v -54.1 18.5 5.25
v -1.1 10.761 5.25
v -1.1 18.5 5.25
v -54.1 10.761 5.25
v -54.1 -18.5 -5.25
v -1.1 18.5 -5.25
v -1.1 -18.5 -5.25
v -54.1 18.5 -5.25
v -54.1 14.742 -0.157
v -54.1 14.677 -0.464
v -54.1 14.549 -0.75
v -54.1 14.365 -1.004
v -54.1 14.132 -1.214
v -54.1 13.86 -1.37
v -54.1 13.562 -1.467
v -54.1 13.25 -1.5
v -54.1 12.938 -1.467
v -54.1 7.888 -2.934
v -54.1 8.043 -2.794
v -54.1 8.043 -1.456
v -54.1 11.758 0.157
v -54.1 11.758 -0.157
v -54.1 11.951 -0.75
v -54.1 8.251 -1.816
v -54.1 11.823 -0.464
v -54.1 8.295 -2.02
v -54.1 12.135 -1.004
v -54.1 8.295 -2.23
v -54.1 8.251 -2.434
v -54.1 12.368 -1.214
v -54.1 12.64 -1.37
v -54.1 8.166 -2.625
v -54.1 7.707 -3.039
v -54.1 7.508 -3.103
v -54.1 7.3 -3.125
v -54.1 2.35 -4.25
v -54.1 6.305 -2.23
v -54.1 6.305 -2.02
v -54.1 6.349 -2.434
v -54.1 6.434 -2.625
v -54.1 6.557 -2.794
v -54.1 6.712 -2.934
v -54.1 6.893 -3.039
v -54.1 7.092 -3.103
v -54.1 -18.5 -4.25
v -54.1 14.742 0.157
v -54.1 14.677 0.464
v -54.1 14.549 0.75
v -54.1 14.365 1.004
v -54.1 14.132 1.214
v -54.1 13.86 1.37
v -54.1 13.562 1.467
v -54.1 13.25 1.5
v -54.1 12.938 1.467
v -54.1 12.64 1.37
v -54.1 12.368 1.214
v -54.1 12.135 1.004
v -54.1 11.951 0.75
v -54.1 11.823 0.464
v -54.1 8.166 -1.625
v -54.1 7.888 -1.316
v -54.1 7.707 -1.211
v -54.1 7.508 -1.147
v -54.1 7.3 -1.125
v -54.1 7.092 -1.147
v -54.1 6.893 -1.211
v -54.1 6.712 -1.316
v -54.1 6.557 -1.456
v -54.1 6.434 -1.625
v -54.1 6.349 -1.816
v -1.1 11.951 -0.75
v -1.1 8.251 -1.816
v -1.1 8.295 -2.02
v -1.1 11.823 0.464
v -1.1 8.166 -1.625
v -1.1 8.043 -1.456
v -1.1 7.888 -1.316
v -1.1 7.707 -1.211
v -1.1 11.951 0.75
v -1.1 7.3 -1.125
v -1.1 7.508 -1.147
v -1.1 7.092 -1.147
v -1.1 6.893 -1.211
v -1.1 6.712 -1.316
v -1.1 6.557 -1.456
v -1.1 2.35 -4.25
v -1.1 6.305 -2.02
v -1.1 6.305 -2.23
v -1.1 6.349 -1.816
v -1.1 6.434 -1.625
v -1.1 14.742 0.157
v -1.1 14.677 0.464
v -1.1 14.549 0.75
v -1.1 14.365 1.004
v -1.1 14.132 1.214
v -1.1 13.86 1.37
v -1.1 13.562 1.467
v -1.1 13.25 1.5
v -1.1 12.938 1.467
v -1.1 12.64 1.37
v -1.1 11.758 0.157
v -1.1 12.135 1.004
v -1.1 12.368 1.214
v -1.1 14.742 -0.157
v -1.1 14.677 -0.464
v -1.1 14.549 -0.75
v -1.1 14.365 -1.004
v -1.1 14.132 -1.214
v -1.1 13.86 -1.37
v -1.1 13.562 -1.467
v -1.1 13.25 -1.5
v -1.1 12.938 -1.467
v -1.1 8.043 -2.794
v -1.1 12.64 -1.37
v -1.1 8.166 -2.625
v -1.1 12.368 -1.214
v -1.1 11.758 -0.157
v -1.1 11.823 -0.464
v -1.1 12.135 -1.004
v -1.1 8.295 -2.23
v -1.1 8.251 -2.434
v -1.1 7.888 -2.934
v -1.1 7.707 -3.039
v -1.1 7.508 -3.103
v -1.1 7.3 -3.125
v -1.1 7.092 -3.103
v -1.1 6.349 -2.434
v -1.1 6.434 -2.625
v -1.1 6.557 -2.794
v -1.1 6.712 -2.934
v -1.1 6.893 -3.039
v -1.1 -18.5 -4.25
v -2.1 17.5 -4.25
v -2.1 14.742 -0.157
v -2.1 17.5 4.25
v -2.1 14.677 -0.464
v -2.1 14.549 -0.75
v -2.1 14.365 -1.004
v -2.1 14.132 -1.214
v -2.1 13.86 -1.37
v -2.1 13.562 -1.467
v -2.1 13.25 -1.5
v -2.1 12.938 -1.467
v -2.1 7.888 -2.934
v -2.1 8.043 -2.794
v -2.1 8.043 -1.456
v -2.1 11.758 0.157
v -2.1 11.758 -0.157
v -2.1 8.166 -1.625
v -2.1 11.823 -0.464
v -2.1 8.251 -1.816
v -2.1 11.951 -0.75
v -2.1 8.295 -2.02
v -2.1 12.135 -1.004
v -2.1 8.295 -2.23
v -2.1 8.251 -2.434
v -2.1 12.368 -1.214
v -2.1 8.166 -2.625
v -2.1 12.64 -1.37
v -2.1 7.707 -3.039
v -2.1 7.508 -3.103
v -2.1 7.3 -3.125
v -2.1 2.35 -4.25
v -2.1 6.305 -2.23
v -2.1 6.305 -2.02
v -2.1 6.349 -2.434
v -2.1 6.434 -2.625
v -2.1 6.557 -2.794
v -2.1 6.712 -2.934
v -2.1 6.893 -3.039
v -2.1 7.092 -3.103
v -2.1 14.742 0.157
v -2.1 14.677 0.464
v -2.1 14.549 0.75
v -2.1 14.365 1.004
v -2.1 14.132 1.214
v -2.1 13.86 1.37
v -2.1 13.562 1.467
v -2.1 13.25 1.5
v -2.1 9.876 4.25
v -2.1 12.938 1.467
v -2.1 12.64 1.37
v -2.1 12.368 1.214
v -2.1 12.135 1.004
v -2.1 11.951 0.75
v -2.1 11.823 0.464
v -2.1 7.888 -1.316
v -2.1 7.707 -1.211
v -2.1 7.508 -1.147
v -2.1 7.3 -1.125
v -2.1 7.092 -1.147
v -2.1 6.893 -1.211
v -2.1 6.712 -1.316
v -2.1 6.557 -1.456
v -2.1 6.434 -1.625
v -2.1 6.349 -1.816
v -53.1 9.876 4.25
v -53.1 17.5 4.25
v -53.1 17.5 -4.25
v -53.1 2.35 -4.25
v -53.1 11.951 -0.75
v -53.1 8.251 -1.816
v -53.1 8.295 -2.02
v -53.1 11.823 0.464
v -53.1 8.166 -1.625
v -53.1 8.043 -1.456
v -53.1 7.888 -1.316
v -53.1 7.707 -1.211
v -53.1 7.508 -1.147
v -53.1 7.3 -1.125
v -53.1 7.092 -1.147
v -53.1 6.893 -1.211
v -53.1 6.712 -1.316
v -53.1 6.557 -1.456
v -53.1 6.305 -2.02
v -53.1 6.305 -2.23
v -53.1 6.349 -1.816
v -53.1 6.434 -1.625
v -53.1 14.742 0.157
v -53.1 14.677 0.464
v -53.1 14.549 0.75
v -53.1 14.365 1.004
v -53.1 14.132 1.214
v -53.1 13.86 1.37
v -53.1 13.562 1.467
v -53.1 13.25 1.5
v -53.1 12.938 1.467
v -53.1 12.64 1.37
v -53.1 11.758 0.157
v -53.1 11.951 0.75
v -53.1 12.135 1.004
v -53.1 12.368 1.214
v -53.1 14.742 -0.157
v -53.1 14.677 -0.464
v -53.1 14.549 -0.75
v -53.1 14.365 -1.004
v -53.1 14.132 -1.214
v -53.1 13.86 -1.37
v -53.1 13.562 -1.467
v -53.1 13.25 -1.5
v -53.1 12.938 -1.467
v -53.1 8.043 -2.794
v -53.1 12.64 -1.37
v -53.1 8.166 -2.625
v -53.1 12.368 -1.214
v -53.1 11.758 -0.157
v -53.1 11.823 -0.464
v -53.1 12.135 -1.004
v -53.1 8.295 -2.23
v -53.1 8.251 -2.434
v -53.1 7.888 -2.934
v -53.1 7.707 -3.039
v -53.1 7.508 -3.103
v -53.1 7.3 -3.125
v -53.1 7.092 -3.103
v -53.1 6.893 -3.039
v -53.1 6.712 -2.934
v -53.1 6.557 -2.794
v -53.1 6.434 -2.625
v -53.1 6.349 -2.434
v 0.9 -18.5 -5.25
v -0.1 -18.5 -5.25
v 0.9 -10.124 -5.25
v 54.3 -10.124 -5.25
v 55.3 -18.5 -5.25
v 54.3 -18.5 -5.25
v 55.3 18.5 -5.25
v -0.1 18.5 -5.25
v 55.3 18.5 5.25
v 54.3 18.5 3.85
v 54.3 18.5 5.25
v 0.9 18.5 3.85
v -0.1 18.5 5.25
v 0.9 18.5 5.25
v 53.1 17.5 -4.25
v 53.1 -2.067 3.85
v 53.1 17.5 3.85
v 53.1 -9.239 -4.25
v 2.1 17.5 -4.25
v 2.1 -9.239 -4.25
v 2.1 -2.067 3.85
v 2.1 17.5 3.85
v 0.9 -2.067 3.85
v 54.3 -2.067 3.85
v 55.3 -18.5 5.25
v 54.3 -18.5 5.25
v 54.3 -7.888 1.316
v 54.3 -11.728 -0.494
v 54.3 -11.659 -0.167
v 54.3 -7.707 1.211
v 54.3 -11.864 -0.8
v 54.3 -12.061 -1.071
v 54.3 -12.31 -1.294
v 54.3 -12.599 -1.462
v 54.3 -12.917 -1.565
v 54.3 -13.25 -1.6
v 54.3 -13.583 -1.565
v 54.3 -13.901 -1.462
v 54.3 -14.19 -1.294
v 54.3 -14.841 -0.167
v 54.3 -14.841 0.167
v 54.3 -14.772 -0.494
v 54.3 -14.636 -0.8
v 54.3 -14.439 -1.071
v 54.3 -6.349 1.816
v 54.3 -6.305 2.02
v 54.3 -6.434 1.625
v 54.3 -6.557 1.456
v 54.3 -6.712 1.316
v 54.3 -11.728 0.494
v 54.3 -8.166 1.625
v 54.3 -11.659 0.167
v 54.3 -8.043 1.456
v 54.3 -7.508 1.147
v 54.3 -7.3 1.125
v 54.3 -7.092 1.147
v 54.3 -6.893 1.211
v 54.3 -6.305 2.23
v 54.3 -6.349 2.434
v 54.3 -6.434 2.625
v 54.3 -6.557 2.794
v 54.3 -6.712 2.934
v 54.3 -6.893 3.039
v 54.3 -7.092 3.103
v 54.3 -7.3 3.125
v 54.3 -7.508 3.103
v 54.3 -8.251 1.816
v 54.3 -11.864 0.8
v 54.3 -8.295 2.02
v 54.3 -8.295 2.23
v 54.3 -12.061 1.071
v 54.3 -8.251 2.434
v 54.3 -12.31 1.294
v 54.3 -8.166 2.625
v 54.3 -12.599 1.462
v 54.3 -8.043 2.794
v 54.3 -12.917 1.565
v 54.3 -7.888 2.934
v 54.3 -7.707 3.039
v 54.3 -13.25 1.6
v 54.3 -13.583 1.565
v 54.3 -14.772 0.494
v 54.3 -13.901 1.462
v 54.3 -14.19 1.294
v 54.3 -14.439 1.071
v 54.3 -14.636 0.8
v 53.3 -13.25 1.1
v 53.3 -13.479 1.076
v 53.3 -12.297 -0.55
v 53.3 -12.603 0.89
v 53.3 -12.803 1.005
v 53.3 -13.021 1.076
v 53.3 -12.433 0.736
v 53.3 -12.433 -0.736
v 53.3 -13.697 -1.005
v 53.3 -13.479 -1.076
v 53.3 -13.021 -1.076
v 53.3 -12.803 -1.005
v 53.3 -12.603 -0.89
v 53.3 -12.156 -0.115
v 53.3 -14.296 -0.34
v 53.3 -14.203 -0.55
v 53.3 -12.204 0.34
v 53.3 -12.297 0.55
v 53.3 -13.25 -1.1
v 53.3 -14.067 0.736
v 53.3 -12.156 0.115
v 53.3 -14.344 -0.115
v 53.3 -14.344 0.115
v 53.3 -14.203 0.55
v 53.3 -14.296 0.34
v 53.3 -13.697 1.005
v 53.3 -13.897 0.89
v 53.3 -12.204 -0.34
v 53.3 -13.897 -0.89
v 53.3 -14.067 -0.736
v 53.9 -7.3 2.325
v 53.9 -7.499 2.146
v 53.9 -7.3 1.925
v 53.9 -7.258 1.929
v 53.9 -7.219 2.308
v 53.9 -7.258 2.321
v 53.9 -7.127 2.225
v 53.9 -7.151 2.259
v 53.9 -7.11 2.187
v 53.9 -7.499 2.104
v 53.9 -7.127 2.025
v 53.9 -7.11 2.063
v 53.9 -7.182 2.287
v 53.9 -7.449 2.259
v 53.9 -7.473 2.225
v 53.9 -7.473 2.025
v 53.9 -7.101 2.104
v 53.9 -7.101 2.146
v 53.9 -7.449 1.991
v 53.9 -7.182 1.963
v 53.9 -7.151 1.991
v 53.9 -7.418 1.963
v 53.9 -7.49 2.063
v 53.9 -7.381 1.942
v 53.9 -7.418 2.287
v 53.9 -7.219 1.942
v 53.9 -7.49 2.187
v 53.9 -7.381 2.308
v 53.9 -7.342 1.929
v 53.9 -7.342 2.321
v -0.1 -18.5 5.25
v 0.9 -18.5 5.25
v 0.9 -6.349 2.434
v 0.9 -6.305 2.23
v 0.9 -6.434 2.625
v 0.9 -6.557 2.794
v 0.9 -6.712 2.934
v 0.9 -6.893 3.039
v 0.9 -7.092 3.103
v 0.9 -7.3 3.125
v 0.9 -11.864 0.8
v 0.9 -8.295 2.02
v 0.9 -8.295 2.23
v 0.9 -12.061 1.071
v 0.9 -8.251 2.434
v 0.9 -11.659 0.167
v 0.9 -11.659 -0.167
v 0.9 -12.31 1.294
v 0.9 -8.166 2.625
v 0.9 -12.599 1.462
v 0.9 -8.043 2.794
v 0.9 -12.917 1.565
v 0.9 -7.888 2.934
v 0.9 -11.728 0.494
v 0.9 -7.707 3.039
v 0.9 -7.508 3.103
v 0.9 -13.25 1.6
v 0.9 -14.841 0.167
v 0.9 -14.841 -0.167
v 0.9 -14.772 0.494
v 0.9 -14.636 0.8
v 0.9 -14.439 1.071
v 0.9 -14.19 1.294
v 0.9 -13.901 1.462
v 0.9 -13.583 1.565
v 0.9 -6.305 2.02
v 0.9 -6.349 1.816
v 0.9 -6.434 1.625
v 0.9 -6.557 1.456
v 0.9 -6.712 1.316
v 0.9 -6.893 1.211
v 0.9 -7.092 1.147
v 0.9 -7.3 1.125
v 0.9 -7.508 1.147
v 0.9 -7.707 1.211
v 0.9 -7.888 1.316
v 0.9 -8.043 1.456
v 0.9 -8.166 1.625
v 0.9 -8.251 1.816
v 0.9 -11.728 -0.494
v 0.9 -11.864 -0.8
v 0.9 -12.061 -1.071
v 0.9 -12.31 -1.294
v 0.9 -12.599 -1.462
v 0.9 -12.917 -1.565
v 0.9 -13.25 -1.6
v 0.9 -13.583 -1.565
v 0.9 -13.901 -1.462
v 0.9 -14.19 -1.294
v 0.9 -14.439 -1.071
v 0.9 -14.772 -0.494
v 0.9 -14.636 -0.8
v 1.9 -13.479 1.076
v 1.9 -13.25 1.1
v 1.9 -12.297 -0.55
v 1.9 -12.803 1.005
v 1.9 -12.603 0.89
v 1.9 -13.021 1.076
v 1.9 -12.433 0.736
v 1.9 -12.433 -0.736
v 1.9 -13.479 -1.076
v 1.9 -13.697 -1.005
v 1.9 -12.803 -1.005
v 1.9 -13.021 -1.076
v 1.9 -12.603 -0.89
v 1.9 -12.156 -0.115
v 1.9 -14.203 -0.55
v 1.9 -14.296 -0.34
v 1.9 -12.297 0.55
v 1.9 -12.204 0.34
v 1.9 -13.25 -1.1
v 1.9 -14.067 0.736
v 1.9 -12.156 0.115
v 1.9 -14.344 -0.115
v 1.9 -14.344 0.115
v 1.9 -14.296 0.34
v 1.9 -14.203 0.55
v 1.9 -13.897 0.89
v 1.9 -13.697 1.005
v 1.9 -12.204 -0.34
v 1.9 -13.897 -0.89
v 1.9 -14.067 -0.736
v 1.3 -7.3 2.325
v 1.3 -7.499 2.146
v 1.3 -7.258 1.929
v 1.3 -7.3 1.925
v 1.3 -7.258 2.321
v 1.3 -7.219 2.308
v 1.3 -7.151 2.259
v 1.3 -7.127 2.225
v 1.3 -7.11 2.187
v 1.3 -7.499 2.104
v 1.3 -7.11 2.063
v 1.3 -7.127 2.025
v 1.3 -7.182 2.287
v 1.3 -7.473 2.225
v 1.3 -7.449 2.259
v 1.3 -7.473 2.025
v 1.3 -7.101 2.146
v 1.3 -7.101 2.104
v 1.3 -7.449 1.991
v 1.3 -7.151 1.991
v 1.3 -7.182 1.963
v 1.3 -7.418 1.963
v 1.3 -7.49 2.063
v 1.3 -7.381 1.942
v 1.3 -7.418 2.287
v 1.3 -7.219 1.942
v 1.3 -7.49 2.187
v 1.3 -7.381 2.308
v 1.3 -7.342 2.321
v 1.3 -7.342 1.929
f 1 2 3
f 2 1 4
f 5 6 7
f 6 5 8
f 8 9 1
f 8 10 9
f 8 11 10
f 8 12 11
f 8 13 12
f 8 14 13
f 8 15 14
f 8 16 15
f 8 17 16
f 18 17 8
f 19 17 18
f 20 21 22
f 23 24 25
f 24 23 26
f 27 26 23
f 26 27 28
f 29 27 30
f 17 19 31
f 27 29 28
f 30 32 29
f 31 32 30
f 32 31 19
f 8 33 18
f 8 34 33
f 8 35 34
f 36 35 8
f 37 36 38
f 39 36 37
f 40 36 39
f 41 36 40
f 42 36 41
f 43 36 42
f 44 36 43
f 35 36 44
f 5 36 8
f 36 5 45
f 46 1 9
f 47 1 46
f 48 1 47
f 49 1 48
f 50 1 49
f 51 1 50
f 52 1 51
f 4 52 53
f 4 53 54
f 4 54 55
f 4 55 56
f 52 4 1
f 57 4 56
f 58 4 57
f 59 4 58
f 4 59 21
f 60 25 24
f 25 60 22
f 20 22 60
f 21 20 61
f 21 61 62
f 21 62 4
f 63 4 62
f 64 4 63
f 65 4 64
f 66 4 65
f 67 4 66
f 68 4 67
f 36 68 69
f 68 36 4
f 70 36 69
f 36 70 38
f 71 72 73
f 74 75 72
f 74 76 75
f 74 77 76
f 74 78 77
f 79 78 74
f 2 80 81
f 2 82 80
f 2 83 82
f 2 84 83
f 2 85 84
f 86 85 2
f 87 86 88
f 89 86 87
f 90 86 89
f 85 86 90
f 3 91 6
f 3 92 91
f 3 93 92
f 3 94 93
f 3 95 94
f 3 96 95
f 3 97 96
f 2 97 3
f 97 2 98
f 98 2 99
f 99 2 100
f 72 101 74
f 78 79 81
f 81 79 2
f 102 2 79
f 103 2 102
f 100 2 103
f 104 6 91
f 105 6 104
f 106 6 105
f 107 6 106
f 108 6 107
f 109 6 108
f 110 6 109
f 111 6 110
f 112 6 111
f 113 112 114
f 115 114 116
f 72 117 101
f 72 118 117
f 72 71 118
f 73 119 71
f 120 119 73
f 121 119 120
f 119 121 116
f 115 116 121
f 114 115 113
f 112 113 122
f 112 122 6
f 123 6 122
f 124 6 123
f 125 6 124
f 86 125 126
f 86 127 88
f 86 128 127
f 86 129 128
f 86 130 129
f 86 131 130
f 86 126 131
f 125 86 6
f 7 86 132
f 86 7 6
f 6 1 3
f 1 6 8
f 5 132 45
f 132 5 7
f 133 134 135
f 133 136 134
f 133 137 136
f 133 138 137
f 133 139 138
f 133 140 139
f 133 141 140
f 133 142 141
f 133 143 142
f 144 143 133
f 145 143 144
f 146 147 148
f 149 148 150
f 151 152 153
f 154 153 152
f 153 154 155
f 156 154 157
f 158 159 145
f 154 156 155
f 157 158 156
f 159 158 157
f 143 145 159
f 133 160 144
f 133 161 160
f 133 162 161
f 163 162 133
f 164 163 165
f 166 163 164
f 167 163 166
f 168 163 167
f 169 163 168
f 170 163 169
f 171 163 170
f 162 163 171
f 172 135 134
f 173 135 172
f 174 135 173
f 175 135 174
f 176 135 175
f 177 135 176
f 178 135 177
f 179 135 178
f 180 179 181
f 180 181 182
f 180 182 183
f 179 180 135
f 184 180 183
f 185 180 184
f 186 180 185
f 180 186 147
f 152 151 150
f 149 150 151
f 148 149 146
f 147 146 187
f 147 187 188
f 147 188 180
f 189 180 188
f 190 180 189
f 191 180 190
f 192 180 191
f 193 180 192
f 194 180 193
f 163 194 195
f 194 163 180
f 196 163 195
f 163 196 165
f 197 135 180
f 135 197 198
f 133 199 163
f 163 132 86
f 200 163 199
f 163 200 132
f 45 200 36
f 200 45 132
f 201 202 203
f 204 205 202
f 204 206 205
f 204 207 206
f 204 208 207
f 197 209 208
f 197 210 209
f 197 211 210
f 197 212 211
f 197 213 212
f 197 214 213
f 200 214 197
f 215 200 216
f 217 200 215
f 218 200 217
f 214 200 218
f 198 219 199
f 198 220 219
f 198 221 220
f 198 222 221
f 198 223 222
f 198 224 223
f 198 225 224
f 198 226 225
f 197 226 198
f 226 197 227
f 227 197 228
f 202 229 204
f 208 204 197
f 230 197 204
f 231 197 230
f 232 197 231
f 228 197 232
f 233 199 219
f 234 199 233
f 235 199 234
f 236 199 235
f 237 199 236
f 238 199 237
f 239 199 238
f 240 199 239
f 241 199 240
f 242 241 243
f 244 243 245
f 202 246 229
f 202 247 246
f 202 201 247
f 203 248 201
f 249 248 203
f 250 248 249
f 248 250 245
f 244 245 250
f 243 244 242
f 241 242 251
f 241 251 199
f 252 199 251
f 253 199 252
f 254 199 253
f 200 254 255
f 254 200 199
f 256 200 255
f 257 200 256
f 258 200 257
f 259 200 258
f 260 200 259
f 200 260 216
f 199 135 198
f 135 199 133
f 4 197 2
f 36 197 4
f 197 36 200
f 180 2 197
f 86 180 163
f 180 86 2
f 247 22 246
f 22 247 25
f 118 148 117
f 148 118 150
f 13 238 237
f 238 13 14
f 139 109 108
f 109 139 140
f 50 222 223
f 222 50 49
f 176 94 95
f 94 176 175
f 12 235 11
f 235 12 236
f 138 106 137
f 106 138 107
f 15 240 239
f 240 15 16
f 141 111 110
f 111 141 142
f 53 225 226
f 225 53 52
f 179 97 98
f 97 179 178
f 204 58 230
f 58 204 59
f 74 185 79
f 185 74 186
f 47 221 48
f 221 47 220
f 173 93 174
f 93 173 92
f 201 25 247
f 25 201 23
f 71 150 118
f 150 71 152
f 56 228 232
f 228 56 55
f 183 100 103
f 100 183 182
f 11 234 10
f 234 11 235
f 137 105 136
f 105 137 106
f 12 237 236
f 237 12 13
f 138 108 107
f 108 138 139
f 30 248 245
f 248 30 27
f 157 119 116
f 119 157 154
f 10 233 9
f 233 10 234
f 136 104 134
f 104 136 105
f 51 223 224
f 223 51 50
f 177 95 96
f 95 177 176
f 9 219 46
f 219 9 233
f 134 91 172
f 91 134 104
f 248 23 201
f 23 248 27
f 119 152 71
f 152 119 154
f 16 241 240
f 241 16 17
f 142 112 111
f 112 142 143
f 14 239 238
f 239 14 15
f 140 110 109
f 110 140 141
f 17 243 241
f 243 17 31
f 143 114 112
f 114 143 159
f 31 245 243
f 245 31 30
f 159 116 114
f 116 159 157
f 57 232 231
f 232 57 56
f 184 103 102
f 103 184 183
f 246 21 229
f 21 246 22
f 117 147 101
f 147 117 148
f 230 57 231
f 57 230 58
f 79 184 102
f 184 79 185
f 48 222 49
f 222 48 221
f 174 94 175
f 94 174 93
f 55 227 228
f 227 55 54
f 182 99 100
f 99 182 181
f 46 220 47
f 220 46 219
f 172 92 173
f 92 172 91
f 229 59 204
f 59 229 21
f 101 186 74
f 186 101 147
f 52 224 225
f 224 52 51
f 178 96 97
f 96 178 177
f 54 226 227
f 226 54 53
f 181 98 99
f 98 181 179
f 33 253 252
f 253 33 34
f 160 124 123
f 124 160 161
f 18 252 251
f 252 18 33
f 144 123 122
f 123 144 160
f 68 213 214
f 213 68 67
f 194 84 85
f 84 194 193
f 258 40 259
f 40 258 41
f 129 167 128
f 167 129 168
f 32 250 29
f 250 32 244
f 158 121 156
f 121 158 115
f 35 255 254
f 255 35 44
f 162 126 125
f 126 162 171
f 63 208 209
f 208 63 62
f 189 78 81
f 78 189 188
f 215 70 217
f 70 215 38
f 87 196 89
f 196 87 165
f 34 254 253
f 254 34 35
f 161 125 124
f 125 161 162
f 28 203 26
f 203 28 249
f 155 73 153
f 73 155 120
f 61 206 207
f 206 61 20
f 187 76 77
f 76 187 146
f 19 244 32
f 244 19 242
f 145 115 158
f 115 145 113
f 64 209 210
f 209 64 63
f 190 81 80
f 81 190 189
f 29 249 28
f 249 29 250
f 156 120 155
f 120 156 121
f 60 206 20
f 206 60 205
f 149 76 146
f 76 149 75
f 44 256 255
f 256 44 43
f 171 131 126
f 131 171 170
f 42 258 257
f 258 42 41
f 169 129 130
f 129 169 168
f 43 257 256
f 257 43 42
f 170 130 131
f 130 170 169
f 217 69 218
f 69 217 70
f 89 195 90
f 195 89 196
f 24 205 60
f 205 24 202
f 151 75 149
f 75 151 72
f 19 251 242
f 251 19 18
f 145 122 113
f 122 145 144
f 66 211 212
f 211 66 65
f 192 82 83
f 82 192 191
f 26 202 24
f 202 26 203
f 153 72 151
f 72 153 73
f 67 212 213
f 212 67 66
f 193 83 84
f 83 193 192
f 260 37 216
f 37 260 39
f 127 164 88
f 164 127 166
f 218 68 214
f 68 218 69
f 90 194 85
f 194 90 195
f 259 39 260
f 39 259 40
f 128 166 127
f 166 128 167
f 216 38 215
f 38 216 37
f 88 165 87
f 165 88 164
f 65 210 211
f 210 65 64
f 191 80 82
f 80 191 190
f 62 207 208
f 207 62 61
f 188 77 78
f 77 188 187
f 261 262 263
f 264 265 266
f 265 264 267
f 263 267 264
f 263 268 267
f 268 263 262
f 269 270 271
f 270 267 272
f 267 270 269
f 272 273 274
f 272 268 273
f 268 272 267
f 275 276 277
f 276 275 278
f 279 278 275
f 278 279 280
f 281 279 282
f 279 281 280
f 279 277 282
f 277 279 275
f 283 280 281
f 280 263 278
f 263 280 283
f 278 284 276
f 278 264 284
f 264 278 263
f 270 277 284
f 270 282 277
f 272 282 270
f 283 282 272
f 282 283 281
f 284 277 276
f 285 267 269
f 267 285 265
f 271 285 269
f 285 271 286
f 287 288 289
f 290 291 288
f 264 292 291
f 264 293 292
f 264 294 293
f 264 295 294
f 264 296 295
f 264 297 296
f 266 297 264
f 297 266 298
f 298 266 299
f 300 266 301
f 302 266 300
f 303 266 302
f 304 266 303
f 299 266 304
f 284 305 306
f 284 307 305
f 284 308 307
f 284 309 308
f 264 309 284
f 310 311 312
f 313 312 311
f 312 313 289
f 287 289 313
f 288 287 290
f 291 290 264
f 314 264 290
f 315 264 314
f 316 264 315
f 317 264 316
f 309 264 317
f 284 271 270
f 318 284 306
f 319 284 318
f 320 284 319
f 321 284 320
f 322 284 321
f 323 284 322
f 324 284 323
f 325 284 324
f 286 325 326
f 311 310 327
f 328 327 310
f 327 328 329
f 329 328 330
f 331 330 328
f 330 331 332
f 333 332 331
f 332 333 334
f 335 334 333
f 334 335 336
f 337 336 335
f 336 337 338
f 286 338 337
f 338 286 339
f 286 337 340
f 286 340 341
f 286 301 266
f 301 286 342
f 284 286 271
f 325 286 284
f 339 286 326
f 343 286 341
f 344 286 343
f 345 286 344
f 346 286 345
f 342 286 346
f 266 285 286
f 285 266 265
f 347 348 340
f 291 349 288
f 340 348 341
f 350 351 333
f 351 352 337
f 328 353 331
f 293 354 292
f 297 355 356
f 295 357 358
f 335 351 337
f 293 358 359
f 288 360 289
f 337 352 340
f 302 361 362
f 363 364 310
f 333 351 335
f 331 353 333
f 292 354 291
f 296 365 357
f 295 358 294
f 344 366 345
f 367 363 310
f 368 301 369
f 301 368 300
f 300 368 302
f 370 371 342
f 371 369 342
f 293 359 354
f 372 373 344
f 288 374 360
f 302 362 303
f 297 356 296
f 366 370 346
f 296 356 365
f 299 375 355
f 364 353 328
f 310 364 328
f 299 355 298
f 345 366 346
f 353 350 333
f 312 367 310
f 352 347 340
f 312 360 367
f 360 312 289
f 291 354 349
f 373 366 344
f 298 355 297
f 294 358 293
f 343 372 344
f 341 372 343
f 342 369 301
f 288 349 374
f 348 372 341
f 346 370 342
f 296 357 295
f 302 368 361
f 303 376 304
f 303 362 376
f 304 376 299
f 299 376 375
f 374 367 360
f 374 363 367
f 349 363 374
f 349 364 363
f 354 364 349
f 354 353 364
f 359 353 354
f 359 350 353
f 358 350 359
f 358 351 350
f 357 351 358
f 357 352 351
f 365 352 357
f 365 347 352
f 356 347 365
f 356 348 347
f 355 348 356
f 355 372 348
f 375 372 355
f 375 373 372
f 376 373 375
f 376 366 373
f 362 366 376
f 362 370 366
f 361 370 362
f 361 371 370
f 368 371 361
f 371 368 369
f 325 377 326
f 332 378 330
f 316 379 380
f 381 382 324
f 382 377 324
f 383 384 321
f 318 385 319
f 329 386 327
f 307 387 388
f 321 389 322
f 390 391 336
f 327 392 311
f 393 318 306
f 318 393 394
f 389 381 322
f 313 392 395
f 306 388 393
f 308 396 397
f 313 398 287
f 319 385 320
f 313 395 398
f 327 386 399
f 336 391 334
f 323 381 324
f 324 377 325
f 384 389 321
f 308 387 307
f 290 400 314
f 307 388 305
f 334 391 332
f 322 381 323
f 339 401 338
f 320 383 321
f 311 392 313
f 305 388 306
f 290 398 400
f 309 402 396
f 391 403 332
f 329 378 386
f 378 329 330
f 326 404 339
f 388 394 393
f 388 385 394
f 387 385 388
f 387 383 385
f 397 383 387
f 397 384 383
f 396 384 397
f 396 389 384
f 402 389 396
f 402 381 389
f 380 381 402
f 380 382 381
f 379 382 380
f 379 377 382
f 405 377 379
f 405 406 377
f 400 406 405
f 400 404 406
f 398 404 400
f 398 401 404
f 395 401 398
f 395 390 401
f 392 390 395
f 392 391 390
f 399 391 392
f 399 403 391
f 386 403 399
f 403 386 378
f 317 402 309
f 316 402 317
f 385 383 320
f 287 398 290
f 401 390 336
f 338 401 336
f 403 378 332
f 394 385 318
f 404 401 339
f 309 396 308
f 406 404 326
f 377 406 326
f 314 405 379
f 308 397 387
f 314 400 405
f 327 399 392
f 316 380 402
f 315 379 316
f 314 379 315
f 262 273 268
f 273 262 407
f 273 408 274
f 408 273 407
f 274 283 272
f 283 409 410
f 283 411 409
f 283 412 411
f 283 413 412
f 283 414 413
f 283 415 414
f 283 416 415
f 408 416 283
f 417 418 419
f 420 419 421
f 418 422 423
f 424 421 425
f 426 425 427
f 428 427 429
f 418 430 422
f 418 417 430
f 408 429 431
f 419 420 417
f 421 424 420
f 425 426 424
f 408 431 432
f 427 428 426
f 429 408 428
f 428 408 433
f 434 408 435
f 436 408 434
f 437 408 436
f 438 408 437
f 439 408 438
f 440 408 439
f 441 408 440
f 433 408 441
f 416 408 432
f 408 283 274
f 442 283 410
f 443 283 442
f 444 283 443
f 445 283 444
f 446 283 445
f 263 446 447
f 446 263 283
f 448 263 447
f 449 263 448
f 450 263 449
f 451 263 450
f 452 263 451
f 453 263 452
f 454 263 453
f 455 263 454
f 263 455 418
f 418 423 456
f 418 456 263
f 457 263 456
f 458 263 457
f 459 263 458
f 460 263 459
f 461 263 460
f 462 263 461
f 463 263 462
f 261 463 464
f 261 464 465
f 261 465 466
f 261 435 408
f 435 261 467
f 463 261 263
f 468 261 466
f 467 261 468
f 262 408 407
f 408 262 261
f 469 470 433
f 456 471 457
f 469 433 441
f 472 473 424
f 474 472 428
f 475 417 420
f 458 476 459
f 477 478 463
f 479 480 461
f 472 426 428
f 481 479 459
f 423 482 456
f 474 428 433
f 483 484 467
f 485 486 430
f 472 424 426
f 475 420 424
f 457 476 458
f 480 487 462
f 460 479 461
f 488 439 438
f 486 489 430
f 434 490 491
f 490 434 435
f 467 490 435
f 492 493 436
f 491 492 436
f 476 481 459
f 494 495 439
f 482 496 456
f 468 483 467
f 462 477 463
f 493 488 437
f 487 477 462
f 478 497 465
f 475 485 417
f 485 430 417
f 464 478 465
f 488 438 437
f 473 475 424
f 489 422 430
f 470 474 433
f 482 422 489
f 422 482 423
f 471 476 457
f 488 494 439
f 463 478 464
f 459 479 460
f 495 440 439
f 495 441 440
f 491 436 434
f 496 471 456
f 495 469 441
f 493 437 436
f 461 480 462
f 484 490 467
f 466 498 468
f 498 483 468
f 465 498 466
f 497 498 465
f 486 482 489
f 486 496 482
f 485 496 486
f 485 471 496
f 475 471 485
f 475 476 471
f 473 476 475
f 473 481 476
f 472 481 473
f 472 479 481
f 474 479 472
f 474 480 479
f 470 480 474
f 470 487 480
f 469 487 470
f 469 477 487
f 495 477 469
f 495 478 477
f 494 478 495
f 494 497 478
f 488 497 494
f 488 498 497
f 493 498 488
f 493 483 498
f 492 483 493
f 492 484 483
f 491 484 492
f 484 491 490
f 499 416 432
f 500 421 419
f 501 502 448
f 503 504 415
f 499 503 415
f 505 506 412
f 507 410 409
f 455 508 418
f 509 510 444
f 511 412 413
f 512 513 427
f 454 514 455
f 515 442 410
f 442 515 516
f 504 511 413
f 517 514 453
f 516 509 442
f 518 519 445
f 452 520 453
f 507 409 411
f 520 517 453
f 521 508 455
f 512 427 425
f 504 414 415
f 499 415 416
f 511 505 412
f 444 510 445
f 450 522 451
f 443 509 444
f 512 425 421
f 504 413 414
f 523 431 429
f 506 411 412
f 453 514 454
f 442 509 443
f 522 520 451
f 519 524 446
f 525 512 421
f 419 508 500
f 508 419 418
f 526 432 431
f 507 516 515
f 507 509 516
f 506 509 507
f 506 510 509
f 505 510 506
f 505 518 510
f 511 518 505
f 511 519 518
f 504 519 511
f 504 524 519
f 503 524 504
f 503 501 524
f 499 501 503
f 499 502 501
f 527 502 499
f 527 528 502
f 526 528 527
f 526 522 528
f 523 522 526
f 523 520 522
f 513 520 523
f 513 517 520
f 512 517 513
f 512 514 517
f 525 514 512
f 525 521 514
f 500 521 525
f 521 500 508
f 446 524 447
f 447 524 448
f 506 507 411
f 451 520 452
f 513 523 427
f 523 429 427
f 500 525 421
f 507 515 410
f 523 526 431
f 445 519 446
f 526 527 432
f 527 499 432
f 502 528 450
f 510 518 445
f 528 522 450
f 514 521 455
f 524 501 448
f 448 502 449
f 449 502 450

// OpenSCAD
interior_dimensions = [51, 35, 8.5];
pocket_depth = 12;
wall_thickness = 1;
cover_gap = 0.4;
hinge_plate_gap = 0.2;
hinge_diameter = 3;
hinge_nub_thickness = 1.0;
latch_diameter = 2;
latch_nub_thickness = 0.4;

epsilon = 0.1;
outsideplusexact = interior_dimensions + [1, 1, 1] * (wall_thickness * 2);
outsideplus = interior_dimensions + [1, 1, 1] * ((wall_thickness + epsilon) * 2);
outsideplushalf = outsideplus / 2;
hinge_plate_thickness = wall_thickness;


printable();


module printable() {
    separation = outsideplus.x + hinge_plate_thickness + 1;
    
    translate([-separation / 2, 0, 0])
    base_half();

    translate([separation / 2, 0, 0])
    rotate([180, 0, 0])
    cover_half();
}

module preview() {
    color("pink") base_half();
    %cover_half();
}

module hinge_preview() {
    difference() {
        union() {
            color("pink") base_half();
            cover_half();
        }
        
        translate(interior_dimensions * -0.45)
        cube(outsideplus);
    }
}

module base_half() {
    difference() {
        shell(false);
        
        cut(false);
        
        hinge_axis() cylinder(d=hinge_diameter, h=outsideplus.x, center=true, $fn=30);
        latch_axis() cylinder(d=latch_diameter, h=outsideplus.x, center=true, $fn=30);
    }
}

module cover_half() {
    render(convexity=4) {  // cheap and improves glitches in preview
        intersection() {
            shell(true);
            cut(true);
        }
        
        mirrored([1, 0, 0])
        cover_end_plate();
    }
}

module cover_end_plate() {
    translate([interior_dimensions.x / 2 + wall_thickness + hinge_plate_gap, 0, 0]) {
        translate([hinge_plate_thickness / 2, 0, 0])
        cube([hinge_plate_thickness, outsideplusexact.y, outsideplusexact.z], center=true);
    
        hinge_axis() inward_nub(hinge_diameter + hinge_plate_gap, hinge_nub_thickness, 2);
        latch_axis() inward_nub(latch_diameter, latch_nub_thickness, 0.5);
    }
}

module inward_nub(d, h, bevel_slope) {
    mirror([0, 0, 1])  // sticks out towards center
    cylinder(d1=d, d2=max(0, d - 2 * h / bevel_slope), h=h, $fn=30);
}

module cut(is_for_cover) {
    slant = interior_dimensions.z / 2;  // TODO not accounting for thicknesses
    translate(is_for_cover ? [0, -cover_gap / sqrt(2), cover_gap] : [0, 0, 0])
    rotate([0, 90, 0])
    mirror([1, 0, 0])
    linear_extrude(interior_dimensions.x + 2 * (wall_thickness + hinge_plate_gap + epsilon), center=true)
    polygon([
        [-interior_dimensions.z/2, -outsideplushalf.y],
        [-interior_dimensions.z/2, outsideplushalf.y - pocket_depth - slant],
        [outsideplushalf.z, outsideplushalf.y - pocket_depth + slant],
        [outsideplushalf.z, -outsideplushalf.y],
    ]);
}

module shell(is_for_cover) {
    difference() {
        minkowski() {
            cube([
                (wall_thickness + (is_for_cover ? hinge_plate_gap + hinge_plate_thickness : 0)) * 2,
                wall_thickness * 2,
                wall_thickness * 2,
            ], center=true);
            
            cube(interior_dimensions, center=true);
        }
        cube(interior_dimensions, center=true);
    }
}

module hinge_axis() {
    translate([0, interior_dimensions.y / 2 - interior_dimensions.z / 2, 0])
    rotate([0, 90, 0])
    children();
}

module latch_axis() {
    // TODO: y position is fudged
    translate([0, interior_dimensions.y / 2 - interior_dimensions.z * 1.2, -interior_dimensions.z * 0.25])
    rotate([0, 90, 0])
    children();
}

module octahedron(r) {
    scale([r, r, r])
    polyhedron(
        points=[
            [1, 0, 0],
            [-1, 0, 0],
            [0, 1, 0], 
            [0, -1, 0],
            [0, 0, 1],
            [0, 0, -1],
        ],
        faces=[
            [0, 4, 2],
            [0, 2, 5],
            [0, 3, 4],
            [0, 5, 3],
            [1, 2, 4],
            [1, 5, 2],
            [1, 4, 3],
            [1, 3, 5],
        ], convexity=1);
}

module mirrored(axis) {
    children();
    mirror(axis) children();
}
